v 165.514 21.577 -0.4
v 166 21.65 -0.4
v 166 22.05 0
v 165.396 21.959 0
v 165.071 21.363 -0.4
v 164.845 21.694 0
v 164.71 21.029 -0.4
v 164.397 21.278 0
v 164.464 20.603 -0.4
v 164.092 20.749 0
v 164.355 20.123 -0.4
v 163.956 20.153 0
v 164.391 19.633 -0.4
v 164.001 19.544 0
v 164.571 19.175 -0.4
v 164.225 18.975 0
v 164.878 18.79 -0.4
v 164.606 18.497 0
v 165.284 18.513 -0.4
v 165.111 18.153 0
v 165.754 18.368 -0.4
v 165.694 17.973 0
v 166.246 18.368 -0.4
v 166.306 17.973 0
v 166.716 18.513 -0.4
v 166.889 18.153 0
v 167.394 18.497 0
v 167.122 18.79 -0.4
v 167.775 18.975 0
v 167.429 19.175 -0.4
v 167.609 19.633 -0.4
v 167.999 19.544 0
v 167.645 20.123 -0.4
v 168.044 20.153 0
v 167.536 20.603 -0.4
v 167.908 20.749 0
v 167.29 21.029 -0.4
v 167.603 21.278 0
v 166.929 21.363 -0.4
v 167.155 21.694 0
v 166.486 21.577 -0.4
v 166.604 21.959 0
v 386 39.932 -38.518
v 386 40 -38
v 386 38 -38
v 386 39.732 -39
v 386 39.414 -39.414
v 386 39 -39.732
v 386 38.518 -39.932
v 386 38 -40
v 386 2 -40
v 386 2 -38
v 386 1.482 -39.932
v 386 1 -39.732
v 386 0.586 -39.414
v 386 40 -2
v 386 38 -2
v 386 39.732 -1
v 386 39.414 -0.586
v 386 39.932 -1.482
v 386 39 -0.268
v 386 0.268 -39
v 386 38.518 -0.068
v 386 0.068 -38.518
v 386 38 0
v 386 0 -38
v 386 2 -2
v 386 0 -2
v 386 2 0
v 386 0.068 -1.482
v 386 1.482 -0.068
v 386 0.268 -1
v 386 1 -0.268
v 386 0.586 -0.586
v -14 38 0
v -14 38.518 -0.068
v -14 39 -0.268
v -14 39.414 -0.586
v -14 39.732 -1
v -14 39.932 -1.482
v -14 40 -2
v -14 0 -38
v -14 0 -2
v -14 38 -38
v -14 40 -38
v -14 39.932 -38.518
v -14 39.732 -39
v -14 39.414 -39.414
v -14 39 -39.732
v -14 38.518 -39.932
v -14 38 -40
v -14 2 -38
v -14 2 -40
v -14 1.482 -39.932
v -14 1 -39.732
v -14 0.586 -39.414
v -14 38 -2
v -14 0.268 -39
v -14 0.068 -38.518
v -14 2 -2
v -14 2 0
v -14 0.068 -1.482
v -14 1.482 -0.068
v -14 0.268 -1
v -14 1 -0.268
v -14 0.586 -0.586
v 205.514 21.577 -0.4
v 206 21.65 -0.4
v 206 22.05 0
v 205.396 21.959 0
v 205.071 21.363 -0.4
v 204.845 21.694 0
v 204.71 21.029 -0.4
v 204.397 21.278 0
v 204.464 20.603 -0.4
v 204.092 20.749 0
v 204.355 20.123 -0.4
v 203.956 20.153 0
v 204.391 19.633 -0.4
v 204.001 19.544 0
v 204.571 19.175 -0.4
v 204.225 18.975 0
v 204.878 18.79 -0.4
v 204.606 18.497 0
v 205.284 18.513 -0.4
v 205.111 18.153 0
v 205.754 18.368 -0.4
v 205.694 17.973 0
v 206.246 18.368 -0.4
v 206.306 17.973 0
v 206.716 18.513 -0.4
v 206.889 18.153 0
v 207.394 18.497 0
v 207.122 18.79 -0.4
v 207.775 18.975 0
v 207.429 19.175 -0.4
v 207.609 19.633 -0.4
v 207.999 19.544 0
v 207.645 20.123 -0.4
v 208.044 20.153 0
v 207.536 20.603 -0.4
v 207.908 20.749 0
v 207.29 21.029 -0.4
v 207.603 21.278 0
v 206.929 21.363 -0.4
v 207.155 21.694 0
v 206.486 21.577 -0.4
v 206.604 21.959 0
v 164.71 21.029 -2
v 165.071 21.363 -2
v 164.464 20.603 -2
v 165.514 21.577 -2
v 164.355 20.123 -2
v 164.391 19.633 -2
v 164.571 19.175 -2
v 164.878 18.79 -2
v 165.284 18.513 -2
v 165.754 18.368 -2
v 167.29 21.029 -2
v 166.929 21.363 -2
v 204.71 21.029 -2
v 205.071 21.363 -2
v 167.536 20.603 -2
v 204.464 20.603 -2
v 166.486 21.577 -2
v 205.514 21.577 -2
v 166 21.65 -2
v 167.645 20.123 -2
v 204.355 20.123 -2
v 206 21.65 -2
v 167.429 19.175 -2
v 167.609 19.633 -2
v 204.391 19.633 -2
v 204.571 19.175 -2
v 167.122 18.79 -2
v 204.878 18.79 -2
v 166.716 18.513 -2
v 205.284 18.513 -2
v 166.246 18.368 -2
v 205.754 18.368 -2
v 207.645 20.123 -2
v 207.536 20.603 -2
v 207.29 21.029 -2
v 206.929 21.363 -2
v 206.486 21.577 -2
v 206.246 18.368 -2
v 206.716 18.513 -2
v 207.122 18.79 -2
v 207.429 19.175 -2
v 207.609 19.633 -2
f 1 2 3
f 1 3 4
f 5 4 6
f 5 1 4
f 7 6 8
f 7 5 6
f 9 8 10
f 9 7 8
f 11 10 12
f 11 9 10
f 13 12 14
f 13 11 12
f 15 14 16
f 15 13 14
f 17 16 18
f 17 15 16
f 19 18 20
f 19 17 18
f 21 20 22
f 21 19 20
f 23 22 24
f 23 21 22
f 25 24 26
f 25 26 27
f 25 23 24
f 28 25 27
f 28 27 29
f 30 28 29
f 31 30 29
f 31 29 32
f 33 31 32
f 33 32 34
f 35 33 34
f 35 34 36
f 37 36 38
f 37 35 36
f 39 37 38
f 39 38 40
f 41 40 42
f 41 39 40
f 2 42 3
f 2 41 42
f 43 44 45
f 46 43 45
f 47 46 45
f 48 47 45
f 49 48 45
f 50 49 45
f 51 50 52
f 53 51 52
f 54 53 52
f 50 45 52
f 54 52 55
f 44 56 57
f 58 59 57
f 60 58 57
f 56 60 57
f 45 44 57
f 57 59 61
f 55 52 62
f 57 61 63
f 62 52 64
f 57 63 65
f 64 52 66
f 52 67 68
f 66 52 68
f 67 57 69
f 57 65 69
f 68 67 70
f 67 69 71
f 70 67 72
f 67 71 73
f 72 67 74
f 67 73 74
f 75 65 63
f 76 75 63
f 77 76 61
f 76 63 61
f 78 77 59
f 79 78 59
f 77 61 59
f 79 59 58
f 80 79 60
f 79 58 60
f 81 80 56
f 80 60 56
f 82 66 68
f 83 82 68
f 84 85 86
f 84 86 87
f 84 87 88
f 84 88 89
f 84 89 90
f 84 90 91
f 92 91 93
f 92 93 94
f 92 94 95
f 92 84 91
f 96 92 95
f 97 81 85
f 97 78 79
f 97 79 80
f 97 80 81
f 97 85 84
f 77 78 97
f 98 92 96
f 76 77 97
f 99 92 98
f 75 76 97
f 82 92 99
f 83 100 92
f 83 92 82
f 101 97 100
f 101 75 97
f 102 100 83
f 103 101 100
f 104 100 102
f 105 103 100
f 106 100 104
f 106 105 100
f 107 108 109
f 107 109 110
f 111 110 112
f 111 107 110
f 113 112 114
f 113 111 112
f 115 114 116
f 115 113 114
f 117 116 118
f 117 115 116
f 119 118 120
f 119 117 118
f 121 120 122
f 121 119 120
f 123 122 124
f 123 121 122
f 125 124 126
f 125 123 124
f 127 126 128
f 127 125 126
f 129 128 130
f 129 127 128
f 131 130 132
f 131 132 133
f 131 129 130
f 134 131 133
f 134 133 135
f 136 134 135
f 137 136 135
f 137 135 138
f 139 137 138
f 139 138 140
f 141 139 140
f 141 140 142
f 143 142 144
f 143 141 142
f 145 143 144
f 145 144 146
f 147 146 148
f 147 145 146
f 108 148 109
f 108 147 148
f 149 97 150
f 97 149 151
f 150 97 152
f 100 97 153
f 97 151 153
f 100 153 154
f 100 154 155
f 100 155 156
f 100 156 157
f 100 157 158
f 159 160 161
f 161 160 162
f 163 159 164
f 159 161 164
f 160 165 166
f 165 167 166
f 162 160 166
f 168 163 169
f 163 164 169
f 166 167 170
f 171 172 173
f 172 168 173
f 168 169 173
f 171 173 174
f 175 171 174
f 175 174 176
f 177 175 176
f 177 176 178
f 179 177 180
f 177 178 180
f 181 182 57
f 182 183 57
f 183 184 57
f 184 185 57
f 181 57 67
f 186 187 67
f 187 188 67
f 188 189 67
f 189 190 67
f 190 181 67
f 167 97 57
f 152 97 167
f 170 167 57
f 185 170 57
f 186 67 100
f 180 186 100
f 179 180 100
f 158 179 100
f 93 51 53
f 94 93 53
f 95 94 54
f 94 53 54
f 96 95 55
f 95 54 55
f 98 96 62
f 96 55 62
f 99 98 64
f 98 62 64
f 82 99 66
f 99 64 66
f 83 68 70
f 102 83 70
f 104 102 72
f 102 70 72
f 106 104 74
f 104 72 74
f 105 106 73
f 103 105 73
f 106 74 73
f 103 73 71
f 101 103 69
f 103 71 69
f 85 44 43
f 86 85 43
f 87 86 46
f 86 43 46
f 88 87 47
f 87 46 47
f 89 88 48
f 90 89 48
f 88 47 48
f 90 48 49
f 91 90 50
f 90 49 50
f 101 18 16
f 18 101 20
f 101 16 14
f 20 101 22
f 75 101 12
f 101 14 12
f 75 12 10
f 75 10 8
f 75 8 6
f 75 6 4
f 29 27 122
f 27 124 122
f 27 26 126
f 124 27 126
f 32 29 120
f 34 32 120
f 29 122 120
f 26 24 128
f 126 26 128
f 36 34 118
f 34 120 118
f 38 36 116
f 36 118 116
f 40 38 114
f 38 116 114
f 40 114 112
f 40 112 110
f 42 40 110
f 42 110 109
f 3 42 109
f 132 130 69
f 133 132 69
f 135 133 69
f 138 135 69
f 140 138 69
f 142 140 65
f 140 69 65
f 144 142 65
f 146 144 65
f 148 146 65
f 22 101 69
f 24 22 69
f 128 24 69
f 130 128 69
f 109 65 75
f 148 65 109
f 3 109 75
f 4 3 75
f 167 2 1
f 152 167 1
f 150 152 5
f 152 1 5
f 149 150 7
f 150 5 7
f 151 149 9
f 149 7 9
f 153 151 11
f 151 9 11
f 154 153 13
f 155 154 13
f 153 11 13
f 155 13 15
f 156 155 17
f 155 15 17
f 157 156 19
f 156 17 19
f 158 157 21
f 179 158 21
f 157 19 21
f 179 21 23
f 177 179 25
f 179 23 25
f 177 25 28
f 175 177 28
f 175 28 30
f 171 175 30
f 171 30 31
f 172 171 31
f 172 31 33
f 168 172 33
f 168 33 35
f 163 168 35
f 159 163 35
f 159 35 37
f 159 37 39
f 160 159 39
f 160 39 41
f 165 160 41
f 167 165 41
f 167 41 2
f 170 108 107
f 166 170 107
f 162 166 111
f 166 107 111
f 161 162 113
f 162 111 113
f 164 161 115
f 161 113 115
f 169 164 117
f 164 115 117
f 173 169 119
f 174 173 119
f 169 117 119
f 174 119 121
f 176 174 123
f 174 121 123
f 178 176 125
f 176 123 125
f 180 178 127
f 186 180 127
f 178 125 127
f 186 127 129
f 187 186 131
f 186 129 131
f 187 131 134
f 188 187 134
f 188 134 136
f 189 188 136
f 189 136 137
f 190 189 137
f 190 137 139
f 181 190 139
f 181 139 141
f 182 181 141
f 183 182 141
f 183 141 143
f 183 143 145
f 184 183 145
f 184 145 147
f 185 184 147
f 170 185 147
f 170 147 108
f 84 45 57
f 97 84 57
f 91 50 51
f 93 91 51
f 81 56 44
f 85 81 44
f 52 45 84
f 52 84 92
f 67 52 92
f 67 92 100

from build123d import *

# Parameters (mm, degrees)
SKETCH004_W             = 36
SKETCH004_H             = 36
PAD004_DEPTH            = 400
SKETCH028_R             = 1.65
HOLE_DEPTH              = 25
HOLE_TIPS_R             = 1.65
CHAMFER_SIZE            = 0.4
BODY004_PLACEMENT_ANGLE = 270


with BuildPart() as part:
    # Sketch004 → Pad004 (new body)
    with BuildSketch(Plane.XZ):
        with BuildLine():
            Line((0, -2), (0, -38))
            ThreePointArc((0, -38), (0.585786, -39.414214), (2, -40))
            Line((2, -40), (38, -40))
            ThreePointArc((38, -40), (39.414214, -39.414214), (40, -38))
            Line((40, -38), (40, -2))
            ThreePointArc((40, -2), (39.414214, -0.585786), (38, 0))
            Line((38, 0), (2, 0))
            ThreePointArc((2, 0), (0.585786, -0.585786), (0, -2))
        make_face()
        with Locations((20, -20)):
            Rectangle(SKETCH004_W, SKETCH004_H, mode=Mode.SUBTRACT)
    extrude(amount=PAD004_DEPTH)

    # Sketch028 (on Face7 of Pad004) → Hole (cut)
    with BuildSketch(Plane(origin=(0, 0, 0), x_dir=(-1, 0, 0), z_dir=(0, 0, 1))):
        with Locations((-20, 180)):
            Circle(SKETCH028_R)
        with Locations((-20, 220)):
            Circle(SKETCH028_R)
    extrude(amount=-HOLE_DEPTH, mode=Mode.SUBTRACT)

    # Hole tips → Hole tip 1 section 0
    with BuildSketch(Plane(origin=(0, 0, -25), x_dir=(-1, 0, 0), z_dir=(0, 0, 1)), mode=Mode.PRIVATE) as hole_tip_1_s0:
        with Locations((-20, 180)):
            Circle(HOLE_TIPS_R)
    loft([hole_tip_1_s0.sketch, Vertex(20, -180, -25.99142)], mode=Mode.SUBTRACT)

    # Hole tips → Hole tip 2 section 0
    with BuildSketch(Plane(origin=(0, 0, -25), x_dir=(-1, 0, 0), z_dir=(0, 0, 1)), mode=Mode.PRIVATE) as hole_tip_2_s0:
        with Locations((-20, 220)):
            Circle(HOLE_TIPS_R)
    loft([hole_tip_2_s0.sketch, Vertex(20, -220, -25.99142)], mode=Mode.SUBTRACT)

    # Chamfer
    chamfer_edges = [part.edges().sort_by_distance(p)[0] for p in [
        (18.35, -180, 0),
        (18.35, -220, 0),
    ]]
    chamfer(chamfer_edges, length=CHAMFER_SIZE)


with BuildPart() as part_1:
    # Body004 placement: moved
    add(part.part.moved(Location((386, 40, 0))).rotate(Axis((386, 40, 0), (0, 0, 1)), BODY004_PLACEMENT_ANGLE))


solid = part_1.part
